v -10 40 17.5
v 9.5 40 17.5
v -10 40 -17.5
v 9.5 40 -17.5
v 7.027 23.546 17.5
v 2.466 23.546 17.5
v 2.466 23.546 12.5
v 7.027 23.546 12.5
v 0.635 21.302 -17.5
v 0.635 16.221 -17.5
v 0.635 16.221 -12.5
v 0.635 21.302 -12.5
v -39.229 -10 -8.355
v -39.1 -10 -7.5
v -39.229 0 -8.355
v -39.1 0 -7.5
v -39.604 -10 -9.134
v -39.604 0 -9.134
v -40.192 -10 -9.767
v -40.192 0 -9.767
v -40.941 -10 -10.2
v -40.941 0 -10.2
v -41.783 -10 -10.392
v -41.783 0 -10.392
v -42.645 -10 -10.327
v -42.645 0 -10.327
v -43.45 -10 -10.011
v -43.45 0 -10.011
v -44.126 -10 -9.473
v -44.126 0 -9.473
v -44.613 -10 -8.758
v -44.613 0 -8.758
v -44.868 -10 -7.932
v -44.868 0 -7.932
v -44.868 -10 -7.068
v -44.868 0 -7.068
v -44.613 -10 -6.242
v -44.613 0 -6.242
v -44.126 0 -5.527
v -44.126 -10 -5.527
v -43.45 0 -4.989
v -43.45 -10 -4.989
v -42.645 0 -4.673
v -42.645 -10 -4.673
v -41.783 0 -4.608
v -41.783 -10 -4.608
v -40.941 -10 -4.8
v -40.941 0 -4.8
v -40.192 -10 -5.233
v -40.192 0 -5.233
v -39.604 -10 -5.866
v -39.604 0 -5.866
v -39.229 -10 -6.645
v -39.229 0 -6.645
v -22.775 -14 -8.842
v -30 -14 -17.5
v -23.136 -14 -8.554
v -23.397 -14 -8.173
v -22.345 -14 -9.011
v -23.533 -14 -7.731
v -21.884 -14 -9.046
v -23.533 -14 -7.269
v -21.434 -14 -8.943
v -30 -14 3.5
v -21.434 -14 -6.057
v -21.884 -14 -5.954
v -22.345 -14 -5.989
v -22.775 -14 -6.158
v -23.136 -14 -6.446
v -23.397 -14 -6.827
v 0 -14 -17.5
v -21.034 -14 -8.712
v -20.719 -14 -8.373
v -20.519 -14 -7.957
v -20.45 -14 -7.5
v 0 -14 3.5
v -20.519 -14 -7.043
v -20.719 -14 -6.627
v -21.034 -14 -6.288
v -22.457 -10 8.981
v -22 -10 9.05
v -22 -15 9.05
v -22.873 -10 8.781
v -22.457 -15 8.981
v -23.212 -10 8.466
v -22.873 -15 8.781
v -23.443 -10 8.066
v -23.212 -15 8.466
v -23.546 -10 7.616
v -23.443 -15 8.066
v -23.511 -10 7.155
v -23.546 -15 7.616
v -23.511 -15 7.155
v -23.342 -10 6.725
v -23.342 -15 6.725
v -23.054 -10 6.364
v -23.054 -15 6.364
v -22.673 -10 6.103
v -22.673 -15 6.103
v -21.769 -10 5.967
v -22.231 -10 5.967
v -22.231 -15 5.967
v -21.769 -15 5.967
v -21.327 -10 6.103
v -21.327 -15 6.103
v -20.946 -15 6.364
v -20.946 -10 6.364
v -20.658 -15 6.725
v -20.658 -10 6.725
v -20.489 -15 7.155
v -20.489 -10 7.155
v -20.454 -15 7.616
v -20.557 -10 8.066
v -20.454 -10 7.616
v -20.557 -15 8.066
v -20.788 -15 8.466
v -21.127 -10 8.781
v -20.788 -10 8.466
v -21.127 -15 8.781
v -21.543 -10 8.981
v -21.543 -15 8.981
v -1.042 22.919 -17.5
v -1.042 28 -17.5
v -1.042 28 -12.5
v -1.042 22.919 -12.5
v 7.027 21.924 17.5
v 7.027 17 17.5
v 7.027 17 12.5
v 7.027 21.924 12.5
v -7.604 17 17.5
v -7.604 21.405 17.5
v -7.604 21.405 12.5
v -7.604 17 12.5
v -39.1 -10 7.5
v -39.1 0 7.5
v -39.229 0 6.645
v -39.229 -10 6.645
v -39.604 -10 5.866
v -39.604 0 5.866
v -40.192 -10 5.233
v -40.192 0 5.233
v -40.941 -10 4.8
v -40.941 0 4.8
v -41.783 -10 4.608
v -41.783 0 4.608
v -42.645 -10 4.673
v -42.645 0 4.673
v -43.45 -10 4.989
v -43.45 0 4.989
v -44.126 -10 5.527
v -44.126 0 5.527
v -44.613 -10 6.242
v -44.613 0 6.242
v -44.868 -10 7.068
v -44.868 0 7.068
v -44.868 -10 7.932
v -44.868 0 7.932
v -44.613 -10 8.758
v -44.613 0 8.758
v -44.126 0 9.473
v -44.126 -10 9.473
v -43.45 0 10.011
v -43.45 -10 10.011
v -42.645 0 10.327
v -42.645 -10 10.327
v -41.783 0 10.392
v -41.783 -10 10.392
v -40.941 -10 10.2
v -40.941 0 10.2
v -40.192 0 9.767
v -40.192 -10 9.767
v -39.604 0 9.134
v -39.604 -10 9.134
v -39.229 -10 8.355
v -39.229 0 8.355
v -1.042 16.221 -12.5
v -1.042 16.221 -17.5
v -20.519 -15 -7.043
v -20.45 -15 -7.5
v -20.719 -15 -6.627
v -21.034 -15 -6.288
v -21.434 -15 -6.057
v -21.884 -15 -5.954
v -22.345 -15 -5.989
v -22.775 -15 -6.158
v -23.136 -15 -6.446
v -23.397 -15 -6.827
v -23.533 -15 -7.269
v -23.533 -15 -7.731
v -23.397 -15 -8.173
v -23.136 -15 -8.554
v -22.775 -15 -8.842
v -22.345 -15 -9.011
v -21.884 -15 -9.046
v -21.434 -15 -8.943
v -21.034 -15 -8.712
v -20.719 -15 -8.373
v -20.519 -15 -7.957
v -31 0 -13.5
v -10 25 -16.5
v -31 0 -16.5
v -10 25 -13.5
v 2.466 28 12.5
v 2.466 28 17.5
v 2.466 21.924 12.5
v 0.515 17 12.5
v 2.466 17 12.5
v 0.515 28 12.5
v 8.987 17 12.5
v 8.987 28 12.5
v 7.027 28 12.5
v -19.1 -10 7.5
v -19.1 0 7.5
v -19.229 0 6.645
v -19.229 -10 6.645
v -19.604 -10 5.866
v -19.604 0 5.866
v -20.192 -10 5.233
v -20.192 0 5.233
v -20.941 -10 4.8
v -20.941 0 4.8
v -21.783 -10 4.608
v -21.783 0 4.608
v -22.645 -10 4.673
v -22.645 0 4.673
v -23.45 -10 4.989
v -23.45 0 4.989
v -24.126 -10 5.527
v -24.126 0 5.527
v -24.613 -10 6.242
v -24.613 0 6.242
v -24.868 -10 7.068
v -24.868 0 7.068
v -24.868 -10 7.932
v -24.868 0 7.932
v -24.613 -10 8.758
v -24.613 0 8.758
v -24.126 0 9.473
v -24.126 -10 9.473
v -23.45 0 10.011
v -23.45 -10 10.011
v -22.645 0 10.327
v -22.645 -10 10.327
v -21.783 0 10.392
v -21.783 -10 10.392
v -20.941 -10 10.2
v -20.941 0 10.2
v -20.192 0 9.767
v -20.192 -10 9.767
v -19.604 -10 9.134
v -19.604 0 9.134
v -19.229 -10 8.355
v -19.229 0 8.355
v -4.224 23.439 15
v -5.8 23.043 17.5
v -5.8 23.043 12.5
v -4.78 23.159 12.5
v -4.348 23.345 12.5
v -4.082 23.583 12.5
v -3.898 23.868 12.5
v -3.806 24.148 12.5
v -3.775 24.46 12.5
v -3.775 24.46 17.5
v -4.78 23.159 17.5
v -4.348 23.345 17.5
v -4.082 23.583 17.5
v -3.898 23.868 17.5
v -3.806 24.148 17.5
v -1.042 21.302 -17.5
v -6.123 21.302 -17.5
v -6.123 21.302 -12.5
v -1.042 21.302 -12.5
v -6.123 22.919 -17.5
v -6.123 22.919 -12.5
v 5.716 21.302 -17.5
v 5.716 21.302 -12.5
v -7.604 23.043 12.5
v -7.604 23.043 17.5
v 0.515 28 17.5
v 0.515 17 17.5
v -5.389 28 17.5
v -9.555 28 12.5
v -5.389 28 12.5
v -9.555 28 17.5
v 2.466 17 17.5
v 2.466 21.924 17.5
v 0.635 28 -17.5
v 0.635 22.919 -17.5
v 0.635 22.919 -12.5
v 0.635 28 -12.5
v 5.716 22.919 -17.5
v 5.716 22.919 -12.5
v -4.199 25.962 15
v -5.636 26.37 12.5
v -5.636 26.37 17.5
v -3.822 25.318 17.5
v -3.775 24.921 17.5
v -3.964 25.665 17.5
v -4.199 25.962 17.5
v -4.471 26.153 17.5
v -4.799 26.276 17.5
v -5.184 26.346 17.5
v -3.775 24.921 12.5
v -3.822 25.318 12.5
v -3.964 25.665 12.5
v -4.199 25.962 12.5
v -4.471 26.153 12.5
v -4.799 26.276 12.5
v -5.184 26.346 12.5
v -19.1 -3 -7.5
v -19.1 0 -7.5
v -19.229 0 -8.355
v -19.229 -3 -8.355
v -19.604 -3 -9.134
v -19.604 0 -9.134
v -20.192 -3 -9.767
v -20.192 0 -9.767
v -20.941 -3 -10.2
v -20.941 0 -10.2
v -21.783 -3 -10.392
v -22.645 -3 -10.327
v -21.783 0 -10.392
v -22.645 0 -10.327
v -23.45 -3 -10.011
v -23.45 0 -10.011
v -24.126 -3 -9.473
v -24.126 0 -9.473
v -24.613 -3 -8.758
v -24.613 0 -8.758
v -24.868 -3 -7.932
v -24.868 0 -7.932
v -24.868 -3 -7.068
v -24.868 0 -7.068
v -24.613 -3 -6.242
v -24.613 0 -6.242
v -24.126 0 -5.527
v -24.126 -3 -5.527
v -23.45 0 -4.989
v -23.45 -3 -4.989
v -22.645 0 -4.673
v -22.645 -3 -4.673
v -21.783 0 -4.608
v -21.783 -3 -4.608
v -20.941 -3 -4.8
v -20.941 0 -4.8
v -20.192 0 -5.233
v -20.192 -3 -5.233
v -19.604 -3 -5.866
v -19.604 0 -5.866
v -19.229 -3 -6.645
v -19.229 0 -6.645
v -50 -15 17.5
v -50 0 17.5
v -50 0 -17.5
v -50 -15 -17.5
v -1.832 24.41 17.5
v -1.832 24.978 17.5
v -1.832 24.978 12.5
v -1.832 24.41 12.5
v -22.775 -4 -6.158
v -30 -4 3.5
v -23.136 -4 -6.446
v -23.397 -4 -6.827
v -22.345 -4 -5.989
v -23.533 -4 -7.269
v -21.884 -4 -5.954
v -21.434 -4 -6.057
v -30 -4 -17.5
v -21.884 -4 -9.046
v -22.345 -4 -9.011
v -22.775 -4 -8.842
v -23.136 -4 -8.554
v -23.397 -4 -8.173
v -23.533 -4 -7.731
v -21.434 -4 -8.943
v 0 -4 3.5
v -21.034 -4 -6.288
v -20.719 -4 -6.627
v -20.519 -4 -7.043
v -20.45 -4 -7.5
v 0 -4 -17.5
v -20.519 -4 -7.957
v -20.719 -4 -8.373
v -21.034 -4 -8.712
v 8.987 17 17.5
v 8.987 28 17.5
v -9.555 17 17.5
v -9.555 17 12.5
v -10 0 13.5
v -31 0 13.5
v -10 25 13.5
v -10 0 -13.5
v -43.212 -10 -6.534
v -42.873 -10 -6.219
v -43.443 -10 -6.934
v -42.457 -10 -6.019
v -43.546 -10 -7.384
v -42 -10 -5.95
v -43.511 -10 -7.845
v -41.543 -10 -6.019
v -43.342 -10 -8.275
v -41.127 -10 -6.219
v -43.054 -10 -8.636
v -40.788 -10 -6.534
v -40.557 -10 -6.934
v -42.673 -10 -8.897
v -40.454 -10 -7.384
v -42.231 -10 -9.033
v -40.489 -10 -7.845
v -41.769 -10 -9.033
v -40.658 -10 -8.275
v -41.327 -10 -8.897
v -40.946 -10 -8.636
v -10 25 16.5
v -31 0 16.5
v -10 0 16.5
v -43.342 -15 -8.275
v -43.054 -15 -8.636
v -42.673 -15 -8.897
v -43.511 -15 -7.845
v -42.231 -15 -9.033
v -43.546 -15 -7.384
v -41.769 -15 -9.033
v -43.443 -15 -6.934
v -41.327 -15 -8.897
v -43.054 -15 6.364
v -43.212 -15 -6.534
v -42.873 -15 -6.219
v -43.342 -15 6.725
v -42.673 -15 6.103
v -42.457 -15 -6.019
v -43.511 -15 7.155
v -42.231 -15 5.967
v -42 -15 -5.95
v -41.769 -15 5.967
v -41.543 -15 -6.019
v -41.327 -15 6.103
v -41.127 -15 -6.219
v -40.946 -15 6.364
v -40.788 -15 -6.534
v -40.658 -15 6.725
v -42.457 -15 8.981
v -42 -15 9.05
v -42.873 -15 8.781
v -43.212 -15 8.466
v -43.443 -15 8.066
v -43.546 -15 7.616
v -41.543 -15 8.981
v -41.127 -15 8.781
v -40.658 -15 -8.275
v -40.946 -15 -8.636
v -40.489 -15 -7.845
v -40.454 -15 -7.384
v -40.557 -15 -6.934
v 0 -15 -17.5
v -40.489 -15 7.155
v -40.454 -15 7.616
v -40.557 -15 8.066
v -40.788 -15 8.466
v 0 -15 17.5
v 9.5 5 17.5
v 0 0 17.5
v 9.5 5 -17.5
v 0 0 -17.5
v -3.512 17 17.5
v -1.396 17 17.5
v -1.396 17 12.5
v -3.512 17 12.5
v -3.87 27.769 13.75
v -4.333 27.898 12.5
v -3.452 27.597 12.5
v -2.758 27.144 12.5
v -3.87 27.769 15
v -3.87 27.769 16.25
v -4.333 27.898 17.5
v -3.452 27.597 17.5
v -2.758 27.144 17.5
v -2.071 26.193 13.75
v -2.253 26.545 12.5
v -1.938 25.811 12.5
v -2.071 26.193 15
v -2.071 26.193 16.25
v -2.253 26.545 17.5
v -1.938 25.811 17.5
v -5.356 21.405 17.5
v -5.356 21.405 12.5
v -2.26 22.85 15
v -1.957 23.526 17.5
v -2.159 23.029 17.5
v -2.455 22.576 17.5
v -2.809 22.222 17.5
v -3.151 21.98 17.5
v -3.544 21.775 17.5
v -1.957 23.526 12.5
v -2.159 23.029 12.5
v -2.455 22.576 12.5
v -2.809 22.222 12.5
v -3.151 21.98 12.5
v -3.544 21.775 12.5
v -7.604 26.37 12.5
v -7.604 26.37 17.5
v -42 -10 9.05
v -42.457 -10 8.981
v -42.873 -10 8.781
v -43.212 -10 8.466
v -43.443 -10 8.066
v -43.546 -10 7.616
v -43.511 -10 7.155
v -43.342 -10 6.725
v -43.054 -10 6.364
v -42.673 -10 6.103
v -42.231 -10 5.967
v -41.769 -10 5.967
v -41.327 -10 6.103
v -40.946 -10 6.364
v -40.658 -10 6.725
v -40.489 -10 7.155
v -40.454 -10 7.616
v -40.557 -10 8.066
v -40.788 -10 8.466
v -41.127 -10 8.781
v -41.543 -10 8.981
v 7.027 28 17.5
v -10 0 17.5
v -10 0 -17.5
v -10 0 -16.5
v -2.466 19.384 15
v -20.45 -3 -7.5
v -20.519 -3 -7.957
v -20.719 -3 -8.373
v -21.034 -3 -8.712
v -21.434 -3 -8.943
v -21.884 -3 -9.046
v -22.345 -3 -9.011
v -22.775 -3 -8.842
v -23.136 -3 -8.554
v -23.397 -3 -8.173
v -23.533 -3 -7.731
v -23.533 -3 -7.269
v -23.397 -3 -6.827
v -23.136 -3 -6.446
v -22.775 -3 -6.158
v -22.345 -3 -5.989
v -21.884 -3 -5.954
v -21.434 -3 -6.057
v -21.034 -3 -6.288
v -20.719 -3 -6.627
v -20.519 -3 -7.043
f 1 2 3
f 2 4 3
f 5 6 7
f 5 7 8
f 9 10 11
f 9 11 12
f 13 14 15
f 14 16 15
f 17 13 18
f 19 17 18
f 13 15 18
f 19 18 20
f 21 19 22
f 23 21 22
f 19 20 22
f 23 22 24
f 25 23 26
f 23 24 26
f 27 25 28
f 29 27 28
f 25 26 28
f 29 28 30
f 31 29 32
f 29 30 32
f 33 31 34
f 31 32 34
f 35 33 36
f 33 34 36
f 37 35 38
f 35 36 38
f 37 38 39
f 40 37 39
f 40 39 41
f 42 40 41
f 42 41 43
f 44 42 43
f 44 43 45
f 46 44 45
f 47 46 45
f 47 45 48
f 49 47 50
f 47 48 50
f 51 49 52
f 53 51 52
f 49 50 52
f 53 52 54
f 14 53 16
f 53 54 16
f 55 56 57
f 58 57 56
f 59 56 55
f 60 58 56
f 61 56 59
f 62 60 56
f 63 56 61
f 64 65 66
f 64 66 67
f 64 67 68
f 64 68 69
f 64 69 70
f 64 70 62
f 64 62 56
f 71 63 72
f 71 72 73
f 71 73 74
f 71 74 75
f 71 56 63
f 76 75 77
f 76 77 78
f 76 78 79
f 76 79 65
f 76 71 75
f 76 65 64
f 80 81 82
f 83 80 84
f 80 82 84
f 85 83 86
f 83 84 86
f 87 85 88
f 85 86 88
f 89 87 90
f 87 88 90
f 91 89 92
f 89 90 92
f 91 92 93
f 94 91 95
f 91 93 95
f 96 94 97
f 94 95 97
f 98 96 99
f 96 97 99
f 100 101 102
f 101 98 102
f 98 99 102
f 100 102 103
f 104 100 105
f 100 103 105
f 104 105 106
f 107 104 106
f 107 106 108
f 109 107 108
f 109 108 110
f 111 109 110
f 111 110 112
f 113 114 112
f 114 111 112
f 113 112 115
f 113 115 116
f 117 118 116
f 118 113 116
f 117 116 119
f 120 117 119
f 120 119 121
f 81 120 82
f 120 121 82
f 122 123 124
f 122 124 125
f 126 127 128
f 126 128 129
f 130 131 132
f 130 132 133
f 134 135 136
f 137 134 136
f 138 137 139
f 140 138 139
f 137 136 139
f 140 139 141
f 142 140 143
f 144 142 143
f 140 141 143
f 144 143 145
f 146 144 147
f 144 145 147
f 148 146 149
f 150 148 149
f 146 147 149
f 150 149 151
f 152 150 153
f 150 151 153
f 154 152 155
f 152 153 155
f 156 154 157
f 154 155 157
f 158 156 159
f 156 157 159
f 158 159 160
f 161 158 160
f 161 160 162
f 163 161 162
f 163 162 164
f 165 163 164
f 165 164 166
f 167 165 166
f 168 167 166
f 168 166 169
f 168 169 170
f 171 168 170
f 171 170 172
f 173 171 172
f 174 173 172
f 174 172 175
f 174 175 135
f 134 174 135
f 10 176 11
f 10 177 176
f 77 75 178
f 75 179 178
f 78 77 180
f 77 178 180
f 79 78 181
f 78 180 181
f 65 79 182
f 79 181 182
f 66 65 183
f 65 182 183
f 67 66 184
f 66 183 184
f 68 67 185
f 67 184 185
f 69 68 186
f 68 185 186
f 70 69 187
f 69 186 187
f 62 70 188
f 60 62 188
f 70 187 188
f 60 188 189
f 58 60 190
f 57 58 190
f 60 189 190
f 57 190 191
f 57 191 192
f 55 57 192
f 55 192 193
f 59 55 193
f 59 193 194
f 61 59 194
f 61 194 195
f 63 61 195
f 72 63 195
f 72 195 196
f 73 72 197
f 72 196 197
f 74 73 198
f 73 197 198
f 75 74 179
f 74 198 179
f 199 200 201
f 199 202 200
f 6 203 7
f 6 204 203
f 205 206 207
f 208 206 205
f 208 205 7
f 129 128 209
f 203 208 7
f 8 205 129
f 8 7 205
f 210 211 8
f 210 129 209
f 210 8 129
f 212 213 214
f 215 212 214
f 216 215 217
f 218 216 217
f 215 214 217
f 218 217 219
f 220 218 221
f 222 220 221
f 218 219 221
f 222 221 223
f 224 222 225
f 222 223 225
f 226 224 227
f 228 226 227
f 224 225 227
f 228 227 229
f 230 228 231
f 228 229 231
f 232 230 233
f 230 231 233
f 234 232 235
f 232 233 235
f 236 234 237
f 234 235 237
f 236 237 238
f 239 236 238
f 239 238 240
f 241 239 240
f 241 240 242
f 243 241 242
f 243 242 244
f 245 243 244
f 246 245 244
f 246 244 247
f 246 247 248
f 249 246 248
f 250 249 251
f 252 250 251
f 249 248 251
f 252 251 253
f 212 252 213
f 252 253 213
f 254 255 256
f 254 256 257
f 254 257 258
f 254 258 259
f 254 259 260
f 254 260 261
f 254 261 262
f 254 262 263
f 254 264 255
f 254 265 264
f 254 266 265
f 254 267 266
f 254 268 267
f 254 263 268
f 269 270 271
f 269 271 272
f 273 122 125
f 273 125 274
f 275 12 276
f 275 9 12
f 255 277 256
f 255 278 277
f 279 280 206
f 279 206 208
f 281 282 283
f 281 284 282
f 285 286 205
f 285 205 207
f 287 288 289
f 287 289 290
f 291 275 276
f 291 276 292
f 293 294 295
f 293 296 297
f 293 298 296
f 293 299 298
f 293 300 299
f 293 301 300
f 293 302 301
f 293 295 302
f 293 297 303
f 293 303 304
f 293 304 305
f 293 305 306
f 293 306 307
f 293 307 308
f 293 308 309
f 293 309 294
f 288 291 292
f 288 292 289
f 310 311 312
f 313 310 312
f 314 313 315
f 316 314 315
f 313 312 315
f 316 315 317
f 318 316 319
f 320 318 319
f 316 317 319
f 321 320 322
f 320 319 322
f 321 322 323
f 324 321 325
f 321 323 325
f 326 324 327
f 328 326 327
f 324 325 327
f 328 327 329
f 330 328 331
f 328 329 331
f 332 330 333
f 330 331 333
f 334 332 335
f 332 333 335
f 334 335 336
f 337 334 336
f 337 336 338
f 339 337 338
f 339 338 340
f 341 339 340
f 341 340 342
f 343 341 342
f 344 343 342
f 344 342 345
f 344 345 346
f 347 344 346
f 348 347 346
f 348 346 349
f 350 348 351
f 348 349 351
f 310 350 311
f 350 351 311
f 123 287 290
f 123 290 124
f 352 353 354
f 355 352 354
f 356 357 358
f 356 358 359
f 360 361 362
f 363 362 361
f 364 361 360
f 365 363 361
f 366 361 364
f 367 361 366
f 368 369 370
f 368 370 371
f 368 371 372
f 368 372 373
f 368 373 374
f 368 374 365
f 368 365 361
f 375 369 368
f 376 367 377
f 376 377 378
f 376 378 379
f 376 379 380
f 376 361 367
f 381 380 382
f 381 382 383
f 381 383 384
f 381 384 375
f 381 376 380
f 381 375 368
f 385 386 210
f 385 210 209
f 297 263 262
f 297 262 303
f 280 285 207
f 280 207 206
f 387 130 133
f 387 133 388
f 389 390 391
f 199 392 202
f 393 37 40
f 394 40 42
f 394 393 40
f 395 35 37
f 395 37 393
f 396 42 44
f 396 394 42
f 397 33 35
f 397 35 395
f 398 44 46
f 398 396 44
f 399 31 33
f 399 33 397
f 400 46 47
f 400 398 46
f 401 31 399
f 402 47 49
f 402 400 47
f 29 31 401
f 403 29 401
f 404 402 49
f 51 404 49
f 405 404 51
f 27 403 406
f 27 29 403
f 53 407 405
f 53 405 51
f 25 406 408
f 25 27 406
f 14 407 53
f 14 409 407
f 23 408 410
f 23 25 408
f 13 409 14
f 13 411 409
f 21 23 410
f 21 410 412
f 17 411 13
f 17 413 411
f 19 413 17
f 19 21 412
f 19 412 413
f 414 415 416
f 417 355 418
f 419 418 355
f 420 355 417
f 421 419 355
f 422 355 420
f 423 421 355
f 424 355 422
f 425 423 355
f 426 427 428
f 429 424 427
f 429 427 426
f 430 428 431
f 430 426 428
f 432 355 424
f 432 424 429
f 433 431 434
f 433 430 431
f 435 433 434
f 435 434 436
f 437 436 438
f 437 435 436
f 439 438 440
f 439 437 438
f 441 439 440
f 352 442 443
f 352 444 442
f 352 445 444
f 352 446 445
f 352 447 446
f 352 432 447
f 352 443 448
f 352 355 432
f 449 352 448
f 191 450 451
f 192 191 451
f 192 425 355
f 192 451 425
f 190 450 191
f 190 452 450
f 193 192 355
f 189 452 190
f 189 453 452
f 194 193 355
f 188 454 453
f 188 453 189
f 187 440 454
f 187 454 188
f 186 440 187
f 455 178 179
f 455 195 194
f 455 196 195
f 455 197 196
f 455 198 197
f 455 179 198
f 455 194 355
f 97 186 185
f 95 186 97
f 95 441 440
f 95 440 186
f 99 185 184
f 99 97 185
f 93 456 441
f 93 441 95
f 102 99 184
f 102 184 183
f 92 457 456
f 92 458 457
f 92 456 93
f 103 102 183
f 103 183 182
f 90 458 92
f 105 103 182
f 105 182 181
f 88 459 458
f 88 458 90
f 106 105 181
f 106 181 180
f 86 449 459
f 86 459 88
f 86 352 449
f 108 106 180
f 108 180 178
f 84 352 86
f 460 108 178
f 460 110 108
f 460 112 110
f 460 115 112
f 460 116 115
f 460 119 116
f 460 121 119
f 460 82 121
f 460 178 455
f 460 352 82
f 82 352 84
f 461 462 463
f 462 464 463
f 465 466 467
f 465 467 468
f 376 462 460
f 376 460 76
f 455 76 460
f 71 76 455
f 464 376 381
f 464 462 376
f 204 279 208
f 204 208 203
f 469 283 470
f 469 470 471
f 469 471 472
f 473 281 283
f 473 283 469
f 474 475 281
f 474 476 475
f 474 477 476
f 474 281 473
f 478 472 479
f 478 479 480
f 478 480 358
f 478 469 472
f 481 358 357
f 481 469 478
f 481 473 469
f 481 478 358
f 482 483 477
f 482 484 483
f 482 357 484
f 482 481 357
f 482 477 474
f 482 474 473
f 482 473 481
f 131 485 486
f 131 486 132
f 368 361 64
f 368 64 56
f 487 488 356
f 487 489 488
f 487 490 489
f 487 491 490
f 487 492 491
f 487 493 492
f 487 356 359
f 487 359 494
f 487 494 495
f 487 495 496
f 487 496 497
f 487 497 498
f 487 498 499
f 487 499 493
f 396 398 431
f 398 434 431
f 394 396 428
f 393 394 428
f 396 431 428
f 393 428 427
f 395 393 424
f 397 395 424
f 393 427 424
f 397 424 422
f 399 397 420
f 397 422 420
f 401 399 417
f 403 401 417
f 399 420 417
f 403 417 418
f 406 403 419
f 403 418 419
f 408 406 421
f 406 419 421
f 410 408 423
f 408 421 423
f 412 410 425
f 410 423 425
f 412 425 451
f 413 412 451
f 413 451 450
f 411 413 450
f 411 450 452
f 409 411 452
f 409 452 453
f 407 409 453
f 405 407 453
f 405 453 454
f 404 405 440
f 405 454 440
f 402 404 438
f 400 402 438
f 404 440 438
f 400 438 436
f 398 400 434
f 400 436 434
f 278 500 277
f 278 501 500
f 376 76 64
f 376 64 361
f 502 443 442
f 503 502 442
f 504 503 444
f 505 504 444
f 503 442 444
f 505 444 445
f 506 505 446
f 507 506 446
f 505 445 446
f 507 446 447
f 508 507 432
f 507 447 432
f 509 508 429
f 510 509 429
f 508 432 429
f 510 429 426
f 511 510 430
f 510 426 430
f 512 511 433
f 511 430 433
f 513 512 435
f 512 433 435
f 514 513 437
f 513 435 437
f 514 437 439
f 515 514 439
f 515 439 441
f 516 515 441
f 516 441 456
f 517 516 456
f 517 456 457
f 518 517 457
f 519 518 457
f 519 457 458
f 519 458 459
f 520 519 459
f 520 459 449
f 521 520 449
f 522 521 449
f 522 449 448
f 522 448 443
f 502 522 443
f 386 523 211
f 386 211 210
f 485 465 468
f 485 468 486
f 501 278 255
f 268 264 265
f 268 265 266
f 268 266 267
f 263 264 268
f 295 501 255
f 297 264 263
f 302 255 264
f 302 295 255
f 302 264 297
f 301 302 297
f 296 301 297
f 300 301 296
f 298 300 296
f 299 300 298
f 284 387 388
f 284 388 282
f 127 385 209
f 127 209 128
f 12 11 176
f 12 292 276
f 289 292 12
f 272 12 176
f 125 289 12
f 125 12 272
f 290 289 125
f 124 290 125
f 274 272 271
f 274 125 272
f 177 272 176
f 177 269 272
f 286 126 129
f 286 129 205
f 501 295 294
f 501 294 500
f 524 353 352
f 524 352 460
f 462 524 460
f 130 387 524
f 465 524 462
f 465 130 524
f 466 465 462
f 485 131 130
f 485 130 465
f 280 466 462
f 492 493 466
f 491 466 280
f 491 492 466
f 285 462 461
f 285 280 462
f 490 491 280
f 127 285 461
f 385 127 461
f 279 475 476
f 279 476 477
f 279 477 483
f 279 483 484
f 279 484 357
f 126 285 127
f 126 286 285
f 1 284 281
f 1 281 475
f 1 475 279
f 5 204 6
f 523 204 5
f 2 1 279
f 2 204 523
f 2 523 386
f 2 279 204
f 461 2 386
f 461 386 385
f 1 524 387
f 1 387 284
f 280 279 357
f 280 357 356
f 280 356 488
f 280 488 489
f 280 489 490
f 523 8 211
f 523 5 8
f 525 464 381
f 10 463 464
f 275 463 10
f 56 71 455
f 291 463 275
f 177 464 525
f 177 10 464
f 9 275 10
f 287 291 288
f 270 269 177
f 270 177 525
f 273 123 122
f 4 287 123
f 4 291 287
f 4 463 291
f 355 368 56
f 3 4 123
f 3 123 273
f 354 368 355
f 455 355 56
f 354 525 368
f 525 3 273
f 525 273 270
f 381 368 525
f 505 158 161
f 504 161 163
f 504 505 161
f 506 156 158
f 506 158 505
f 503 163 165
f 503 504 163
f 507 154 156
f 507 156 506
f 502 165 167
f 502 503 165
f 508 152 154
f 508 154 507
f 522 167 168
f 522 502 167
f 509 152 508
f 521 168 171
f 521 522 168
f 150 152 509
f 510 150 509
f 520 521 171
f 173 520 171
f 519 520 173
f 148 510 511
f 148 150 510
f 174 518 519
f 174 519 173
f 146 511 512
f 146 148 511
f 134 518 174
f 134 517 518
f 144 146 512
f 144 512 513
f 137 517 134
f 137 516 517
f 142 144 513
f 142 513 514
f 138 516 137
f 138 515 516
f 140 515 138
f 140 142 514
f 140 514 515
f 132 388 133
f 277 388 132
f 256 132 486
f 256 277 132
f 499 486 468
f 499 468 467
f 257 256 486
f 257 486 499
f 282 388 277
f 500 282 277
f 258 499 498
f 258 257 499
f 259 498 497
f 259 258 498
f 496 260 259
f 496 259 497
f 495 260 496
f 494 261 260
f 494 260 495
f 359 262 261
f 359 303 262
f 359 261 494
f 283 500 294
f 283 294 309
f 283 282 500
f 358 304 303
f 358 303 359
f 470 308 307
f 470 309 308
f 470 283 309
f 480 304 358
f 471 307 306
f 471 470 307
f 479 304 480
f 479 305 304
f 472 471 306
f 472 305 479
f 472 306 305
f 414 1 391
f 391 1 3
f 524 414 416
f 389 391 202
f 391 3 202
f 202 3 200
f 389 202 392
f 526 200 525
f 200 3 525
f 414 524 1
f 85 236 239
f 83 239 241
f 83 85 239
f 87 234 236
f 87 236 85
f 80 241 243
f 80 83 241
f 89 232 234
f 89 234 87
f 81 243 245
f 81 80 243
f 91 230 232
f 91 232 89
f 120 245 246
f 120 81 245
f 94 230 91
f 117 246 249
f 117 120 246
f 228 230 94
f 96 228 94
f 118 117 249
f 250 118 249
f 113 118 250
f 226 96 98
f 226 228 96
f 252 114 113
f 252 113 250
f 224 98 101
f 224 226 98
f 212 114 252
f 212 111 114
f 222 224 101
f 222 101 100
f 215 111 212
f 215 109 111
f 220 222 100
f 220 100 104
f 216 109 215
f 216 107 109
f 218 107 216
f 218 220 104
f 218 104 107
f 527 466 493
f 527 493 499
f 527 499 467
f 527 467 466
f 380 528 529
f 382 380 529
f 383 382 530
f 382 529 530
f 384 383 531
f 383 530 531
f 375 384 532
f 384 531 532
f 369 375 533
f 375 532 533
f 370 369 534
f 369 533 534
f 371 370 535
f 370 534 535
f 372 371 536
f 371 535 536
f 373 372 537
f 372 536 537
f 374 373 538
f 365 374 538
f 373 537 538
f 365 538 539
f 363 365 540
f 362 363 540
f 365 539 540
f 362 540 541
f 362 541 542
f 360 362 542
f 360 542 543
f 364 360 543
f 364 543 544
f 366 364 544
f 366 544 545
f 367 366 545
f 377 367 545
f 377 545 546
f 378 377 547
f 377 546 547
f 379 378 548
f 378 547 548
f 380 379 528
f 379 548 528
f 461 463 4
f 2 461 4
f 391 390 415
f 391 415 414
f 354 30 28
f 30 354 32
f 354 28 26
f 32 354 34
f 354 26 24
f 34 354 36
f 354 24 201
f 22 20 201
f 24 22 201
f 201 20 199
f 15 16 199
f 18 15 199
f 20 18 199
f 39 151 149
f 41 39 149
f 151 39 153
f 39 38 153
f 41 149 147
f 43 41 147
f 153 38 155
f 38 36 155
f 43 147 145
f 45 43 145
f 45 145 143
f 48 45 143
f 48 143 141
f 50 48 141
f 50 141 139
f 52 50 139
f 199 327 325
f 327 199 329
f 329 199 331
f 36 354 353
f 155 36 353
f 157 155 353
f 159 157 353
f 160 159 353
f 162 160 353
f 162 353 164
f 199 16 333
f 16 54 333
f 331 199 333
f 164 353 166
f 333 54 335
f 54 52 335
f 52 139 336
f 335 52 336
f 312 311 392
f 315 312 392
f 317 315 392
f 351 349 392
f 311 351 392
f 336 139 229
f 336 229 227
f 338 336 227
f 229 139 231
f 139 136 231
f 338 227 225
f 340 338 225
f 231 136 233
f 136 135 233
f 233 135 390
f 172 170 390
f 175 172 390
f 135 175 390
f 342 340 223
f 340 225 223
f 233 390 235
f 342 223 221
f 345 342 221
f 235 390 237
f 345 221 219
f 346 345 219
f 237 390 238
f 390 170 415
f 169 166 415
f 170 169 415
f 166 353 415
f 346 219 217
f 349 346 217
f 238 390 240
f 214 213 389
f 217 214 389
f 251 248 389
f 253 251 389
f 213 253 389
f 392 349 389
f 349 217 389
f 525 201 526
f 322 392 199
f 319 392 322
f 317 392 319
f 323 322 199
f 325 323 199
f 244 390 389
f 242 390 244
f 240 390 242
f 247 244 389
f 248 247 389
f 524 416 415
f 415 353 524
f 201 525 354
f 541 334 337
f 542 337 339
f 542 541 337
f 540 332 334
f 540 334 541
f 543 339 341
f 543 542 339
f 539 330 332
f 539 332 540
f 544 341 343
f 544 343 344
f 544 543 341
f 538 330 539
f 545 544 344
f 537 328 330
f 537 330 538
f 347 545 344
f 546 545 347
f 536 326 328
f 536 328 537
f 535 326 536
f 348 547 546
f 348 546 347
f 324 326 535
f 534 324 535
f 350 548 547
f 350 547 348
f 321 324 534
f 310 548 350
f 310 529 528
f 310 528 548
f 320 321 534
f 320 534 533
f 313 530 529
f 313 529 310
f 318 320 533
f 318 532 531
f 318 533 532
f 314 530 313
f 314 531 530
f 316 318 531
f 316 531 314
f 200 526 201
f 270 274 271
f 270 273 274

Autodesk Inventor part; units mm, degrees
ref_plane "YZ Plane" through (0, 0, 0) normal (1, 0, 0) x (0, 1, 0)
ref_plane "XZ Plane" through (0, 0, 0) normal (0, 1, 0) x (-1, 0, 0)
sketch "Sketch1" plane through (0, 0, 0) normal (0, 0, 1) x (1, 0, 0)
  line L0 (-10, 40) -> (-10, 0)
  line L1 (-10, 0) -> (0, 0)
  line L2 (0, 0) -> (9.5, 5)
  line L3 (9.5, 5) -> (9.5, 40)
  line L4 (9.5, 40) -> (-10, 40)
  dimension "d0" = 40
  dimension "d2" = 10
  dimension "d55" = 9.5
  dimension "d57" = 35
extrude "Extrusion1" add sketch "Sketch1" along normal mid plane 35
ref_plane "Work Plane1" through (0, 0, 15) normal (0, 0, 1) x (1, 0, 0)
sketch "Sketch2" plane through (0, 0, 15) normal (0, 0, 1) x (1, 0, 0)
  line L0 (-10, 40) -> (-10, 0) projected
  line L1 (-10, 0) -> (0, 0) projected
  line L2 (-10, 0) -> (-31, 0)
  line L3 (-10, 0) -> (11, 0) construction
  line L4 (0, 0) -> (9.5, 5) projected
  line L5 (9.5, 5) -> (9.5, 40) projected
  line L6 (9.5, 40) -> (-10, 40) projected
  line L7 (-31, 0) -> (-10, 25)
  line L8 (-10, 0) -> (-10, 25)
  dimension "d9" = 21
  dimension "d10" = 180
  dimension "d88" = 25
extrude "Extrusion2" add sketch "Sketch2" along normal mid plane 3 contours L0 L2 L7
mirror "Mirror1" about plane through (0, 0, 0) normal (0, 0, 1) of "Extrusion2"
sketch "Sketch3" plane through (-10, 0, 17.5) normal (0, -1, 0) x (1, 0, 0)
  line L0 (-40, 2) -> (-15.2727, 11)
  line L1 (-15.2727, 11) -> (10, 11)
  line L2 (10, 11) -> (10, -46)
  line L3 (-40, 2) -> (-40, -37)
  line L4 (-40, -37) -> (-15.2727, -46)
  line L5 (-15.2727, -46) -> (10, -46)
  line L6 (10, -35) -> (10, 0) projected
  line L7 (10, -35) -> (10, 0) projected
  line L8 (0, 0) -> (0, -1) projected
  line L9 (10, -35) -> (0, -35) projected
  line L10 (0, 0) -> (10, 0) projected
  line L11 (-21, -1) -> (0, -1) projected
  line L12 (-21, -4) -> (-21, -1) projected
  line L13 (0, -4) -> (-21, -4) projected
  line L14 (0, -4) -> (0, -31) projected
  line L15 (0, -31) -> (-21, -31) projected
  line L16 (-21, -31) -> (-21, -34) projected
  line L17 (-21, -34) -> (0, -34) projected
  line L18 (0, -34) -> (0, -35) projected
  point P0 (10, -17.5)
  point P1 (-2.6364, 11)
  point P2 (10, -17.5)
  point P3 (10, -17.5)
  point P4 (10, -17.5)
  point P5 (-2.6364, -46)
  point P6 (-40, -17.5)
  point P7 (10, -17.5)
  point P8 (10, -35)
  point P9 (10, 0)
  dimension "d17" = 57
  dimension "d18" = 39
  dimension "d19" = 9
  dimension "d20" = 9
  dimension "d21" = 50
  dimension "d76" = 110
extrude "Extrusion3" add sketch "Sketch3" along normal blind 15
sketch "Sketch4" plane through (-10, 0, 17.5) normal (0, 1, 0) x (1, 0, 0)
  line L0 (10, 17.5) -> (-48, 17.5) construction
  line L1 (-32, 10) -> (-12, 10) construction
  line L2 (-32, 25) -> (-32, 10) construction
  line L3 (10, 35) -> (0, 35) projected
  line L4 (10, 46) -> (10, 35) projected
  line L5 (-15.2727, 46) -> (10, 46) projected
  line L6 (-40, 37) -> (-15.2727, 46) projected
  line L7 (-40, -2) -> (-40, 37) projected
  line L8 (-15.2727, -11) -> (-40, -2) projected
  line L9 (10, -11) -> (-15.2727, -11) projected
  line L10 (10, 0) -> (10, -11) projected
  line L11 (0, 0) -> (10, 0) projected
  line L12 (0, 0) -> (0, 1) projected
  line L13 (-21, 1) -> (0, 1) projected
  line L14 (-21, 4) -> (-21, 1) projected
  line L15 (0, 4) -> (-21, 4) projected
  line L16 (0, 4) -> (0, 31) projected
  line L17 (0, 31) -> (-21, 31) projected
  line L18 (-21, 31) -> (-21, 34) projected
  line L19 (-21, 34) -> (0, 34) projected
  line L20 (0, 34) -> (0, 35) projected
  point P0 (-32, 17.5)
  point P1 (-19, 17.5)
  dimension "d26" = 20
  dimension "d27" = 15
  dimension "d58" = 13
  dimension "d59" = 8
hole "Hole1" at (-42, 0, 7.5) at (-22, 0, 7.5) at (-42, 0, -7.5) direction (0, -1, 0) diameter 3.1 end through all
sketch "Sketch5" plane through (0, 0, -17.5) normal (1, 0, 0) x (0, 0, -1)
  line L0 (11, 0) -> (0, 0) projected
  line L1 (-35, 0) -> (-46, 0) projected
  line L2 (-46, 0) -> (-46, -15) projected
  line L3 (11, -15) -> (-46, -15) projected
  line L4 (11, 0) -> (11, -15) projected
  line L5 (-46, 0) -> (-46, -15) projected
  line L6 (-21, -4) -> (9, -4)
  line L7 (9, -4) -> (9, -14)
  line L8 (9, -14) -> (-21, -14)
  line L9 (-21, -14) -> (-21, -4)
  line L10 (0, 0) -> (-35, 0) projected
  point P0 (-17.5, 0)
  point P1 (-17.5, 0)
  point P2 (-46, -7.5)
  point P3 (-46, -7.5)
  point P4 (11, -12.5)
  point P5 (11, -2.5)
  dimension "d46" = 30
  dimension "d47" = 10
  dimension "d48" = 2
  dimension "d49" = 4
extrude "Extrusion4" cut sketch "Sketch5" against normal blind 30 contours L6 L7 L8 L9
sketch "Sketch6" plane through (-10, 0, 17.5) normal (0, 1, 0) x (1, 0, 0)
  circle A0 centre (-32, 25) radius 1.55 projected
  circle A1 centre (-12, 10) radius 1.55 projected
  circle A2 centre (-32, 10) radius 1.55 projected
  line L0 (10, 35) -> (0, 35) projected
  line L1 (10, 46) -> (10, 35) projected
  line L2 (-15.2727, 46) -> (10, 46) projected
  line L3 (-40, 37) -> (-15.2727, 46) projected
  line L4 (-40, -2) -> (-40, 37) projected
  line L5 (-15.2727, -11) -> (-40, -2) projected
  line L6 (10, -11) -> (-15.2727, -11) projected
  line L7 (10, 0) -> (10, -11) projected
  line L8 (0, 0) -> (10, 0) projected
  line L9 (0, 0) -> (0, 1) projected
  circle A3 centre (-12, 25) radius 2.9
  line L10 (-21, 1) -> (0, 1) projected
  line L11 (-21, 4) -> (-21, 1) projected
  line L12 (0, 4) -> (-21, 4) projected
  line L13 (0, 4) -> (0, 31) projected
  line L14 (0, 31) -> (-21, 31) projected
  line L15 (-21, 31) -> (-21, 34) projected
  line L16 (-21, 34) -> (0, 34) projected
  line L17 (0, 34) -> (0, 35) projected
  point P0 (10, 17.5)
  dimension "d41" = 5.8
  dimension "d42" = 20
  dimension "d43" = 15
extrude "Extrusion5" cut sketch "Sketch6" against normal blind 3 contours A3
sketch "Sketch7" plane through (-10, -15, 17.5) normal (0, -1, 0) x (1, 0, 0)
  circle A0 centre (-12, -25) radius 1.55
  circle A1 centre (-32, -25) radius 1.55 projected
  circle A2 centre (-12, -10) radius 1.55 projected
  circle A3 centre (-32, -10) radius 1.55 projected
  line L0 (10, -46) -> (10, 11) projected
  line L1 (10, 11) -> (-15.2727, 11) projected
  line L2 (-15.2727, 11) -> (-40, 2) projected
  line L3 (-40, 2) -> (-40, -37) projected
  line L4 (-40, -37) -> (-15.2727, -46) projected
  line L5 (-15.2727, -46) -> (10, -46) projected
  point P0 (10, -17.5)
  dimension "d50" = 15
  dimension "d51" = 20
  dimension "d52" = 3.1
extrude "Extrusion6" cut sketch "Sketch7" against normal up to surface (1 mm away) contours A0
sketch "Sketch8" plane through (0, 0, 17.5) normal (0, 0, 1) x (1, 0, 0)
  line L0 (-10, 0) -> (0, 0) projected
  line L1 (0, 0) -> (9.5, 5) projected
  line L2 (9.5, 5) -> (9.5, 40) projected
  line L3 (9.5, 40) -> (-10, 40) projected
  line L4 (-10, 40) -> (-10, 0) projected
  line L5 (-10.7901, 28) -> (5, 28) construction
  line L6 (5, 28) -> (5, 11.9362) construction
  line L7 (5, 11.9362) -> (-10.7901, 11.9362) construction
  line L8 (-10.7901, 11.9362) -> (-10.7901, 28) construction
  line L9 (-5.3559, 21.4049) -> (-7.6037, 21.4049)
  line L10 (-7.6037, 21.4049) -> (-7.6037, 17)
  line L11 (-7.6037, 17) -> (-9.555, 17)
  line L12 (-9.555, 17) -> (-9.555, 28)
  line L13 (-9.555, 28) -> (-5.3889, 28)
  spline S0 degree 2 poles (-5.3889, 28) (-4.5326, 28) (-3.207, 27.5389) (-2.3095, 26.7485) (-1.832, 25.637) (-1.832, 24.9783) knots 0 0 0 1 2 3 4 4 4
  line L14 (-1.832, 24.9783) -> (-1.832, 24.4102)
  spline S1 degree 2 poles (-1.832, 24.4102) (-1.832, 23.5457) (-2.6883, 22.1542) (-3.5445, 21.7754) knots 0 0 0 1 2 2 2
  spline S2 degree 2 poles (-3.5445, 21.7754) (-2.9929, 20.5651) (-1.939, 18.2021) (-1.3956, 17) knots 0 0 0 1 2 2 2
  line L15 (-1.3956, 17) -> (-3.5116, 17)
  line L16 (-3.5116, 17) -> (-5.3559, 21.4049)
  line L17 (-7.6037, 26.3698) -> (-7.6037, 23.0434)
  line L18 (-7.6037, 23.0434) -> (-5.8005, 23.0434)
  spline S3 degree 2 poles (-5.8005, 23.0434) (-4.6725, 23.0434) (-3.7751, 23.8338) (-3.7751, 24.4596) knots 0 0 0 1 2 2 2
  line L19 (-3.7751, 24.4596) -> (-3.7751, 24.9207)
  spline S4 degree 2 poles (-3.7751, 24.9207) (-3.7751, 25.5546) (-4.6231, 26.3698) (-5.6359, 26.3698) knots 0 0 0 1 2 2 2
  line L20 (-5.6359, 26.3698) -> (-7.6037, 26.3698)
  line L21 (7.0273, 21.9237) -> (2.4659, 21.9237)
  line L22 (2.4659, 21.9237) -> (2.4659, 17)
  line L23 (2.4659, 17) -> (0.5146, 17)
  line L24 (0.5146, 17) -> (0.5146, 28)
  line L25 (0.5146, 28) -> (2.4659, 28)
  line L26 (2.4659, 28) -> (2.4659, 23.5457)
  line L27 (2.4659, 23.5457) -> (7.0273, 23.5457)
  line L28 (7.0273, 23.5457) -> (7.0273, 28)
  line L29 (7.0273, 28) -> (8.9869, 28)
  line L30 (8.9869, 28) -> (8.9869, 17)
  line L31 (8.9869, 17) -> (7.0273, 17)
  line L32 (7.0273, 17) -> (7.0273, 21.9237)
  point P0 (-7, 15)
  dimension "d68" = 12
  dimension "d69" = 15
extrude "Extrusion7" cut sketch "Sketch8" against normal blind 5 contours L9 L10 L11 L12 L13 S0 L14 S1 S2 L15 L16 | L21 L22 L23 L24 L25 L26 L27 L28 L29 L30 L31 L32
sketch "Sketch9" plane through (0, 0, -17.5) normal (0, 0, -1) x (-1, 0, 0)
  line L0 (-0.5146, 17) -> (-0.5146, 28) projected
  line L1 (0, 0) -> (10, 0) projected
  line L2 (10, 0) -> (10, 40) projected
  line L3 (10, 40) -> (-9.5, 40) projected
  line L4 (-9.5, 40) -> (-9.5, 5) projected
  line L5 (-9.5, 5) -> (0, 0) projected
  line L6 (-7.3088, 28) -> (-3.8059, 28) construction
  line L7 (-3.8059, 28) -> (-3.8059, 25.5662) construction
  line L8 (-3.8059, 25.5662) -> (-7.3088, 25.5662) construction
  line L9 (-7.3088, 25.5662) -> (-7.3088, 28) construction
  line L10 (5.5, 50.4054) -> (5.5, 41.2692)
  line L11 (6.1232, 21.3023) -> (1.0421, 21.3023)
  line L12 (1.0421, 21.3023) -> (1.0421, 16.2212)
  line L13 (1.0421, 16.2212) -> (-0.6353, 16.2212)
  line L14 (-0.6353, 16.2212) -> (-0.6353, 21.3023)
  line L15 (-0.6353, 21.3023) -> (-5.7164, 21.3023)
  line L16 (-5.7164, 21.3023) -> (-5.7164, 22.919)
  line L17 (-5.7164, 22.919) -> (-0.6353, 22.919)
  line L18 (-0.6353, 22.919) -> (-0.6353, 28)
  line L19 (-0.6353, 28) -> (1.0421, 28)
  line L20 (1.0421, 28) -> (1.0421, 22.919)
  line L21 (1.0421, 22.919) -> (6.1232, 22.919)
  line L22 (6.1232, 22.919) -> (6.1232, 21.3023)
  dimension "d72" = 12
  dimension "d73" = 15
extrude "Extrusion8" cut sketch "Sketch9" against normal blind 5 contours L11 L12 L13 L14 L15 L16 L17 L18 L19 L20 L21 L22
sketch "Sketch10" plane through (-10, 0, 17.5) normal (0, 1, 0) x (1, 0, 0)
  line L0 (-39.35, 19.5) -> (-4.65, 19.5) projected
  circle A0 centre (-32, 25) radius 1.55 projected
  circle A1 centre (-32, 10) radius 1.55 projected
  circle A2 centre (-12, 10) radius 1.55 projected
  circle A3 centre (-32, 25) radius 2.9
  circle A4 centre (-32, 10) radius 2.9
  circle A5 centre (-12, 10) radius 2.9
  point P0 (10, 17.5)
  dimension "d77" = 5.8
  dimension "d78" = 5.8
  dimension "d79" = 5.8
extrude "Extrusion9" cut sketch "Sketch10" against normal blind 10 contours A0 | A1 | A3 | A4 | A5
sketch "Sketch12" plane through (-10, 0, 17.5) normal (0, 1, 0) x (1, 0, 0)
  circle A0 centre (-12, 25) radius 2.9 projected
  circle A1 centre (-12, 25) radius 1.55
  point P0 (10, 17.5)
  dimension "d85" = 3.1
extrude "Extrusion11" cut sketch "Sketch12" against normal blind 4 contours A1
sketch "Sketch13" plane through (-10, 0, 17.5) normal (0, 1, 0) x (1, 0, 0)
  circle A0 centre (-12, 10) radius 2.9 projected
  circle A1 centre (-32, 25) radius 2.9 projected
  circle A2 centre (-32, 10) radius 2.9 projected
  circle A3 centre (-12, 25) radius 2.9 projected
  line L0 (10, 35) -> (0, 35) projected
  line L1 (10, 46) -> (10, 35) projected
  line L2 (-15.2727, 46) -> (10, 46) projected
  line L3 (-40, 37) -> (-15.2727, 46) projected
  line L4 (-40, -2) -> (-40, 37) projected
  line L5 (-15.2727, -11) -> (-40, -2) projected
  line L6 (10, -11) -> (-15.2727, -11) projected
  line L7 (10, 0) -> (10, -11) projected
  line L8 (0, 0) -> (10, 0) projected
  line L9 (0, 0) -> (0, 1) projected
  line L10 (-21, 1) -> (0, 1) projected
  line L11 (-21, 4) -> (-21, 1) projected
  line L12 (0, 4) -> (-21, 4) projected
  line L13 (0, 4) -> (0, 31) projected
  line L14 (0, 31) -> (-21, 31) projected
  line L15 (-21, 31) -> (-21, 34) projected
  line L16 (-21, 34) -> (0, 34) projected
  line L17 (0, 34) -> (0, 35) projected
  line L18 (10, -11) -> (-40, -11)
  line L19 (-40, -11) -> (-40, 0)
  line L20 (-40, 0) -> (10, 0)
  line L21 (10, 0) -> (10, -11)
  line L22 (10, 46) -> (-40, 46)
  line L23 (-40, 46) -> (-40, 35)
  line L24 (-40, 35) -> (10, 35)
  line L25 (10, 35) -> (10, 46)
  point P0 (10, 17.5)
  point P1 (10, 40.5)
  point P2 (-40, 35)
  dimension "d89" = 11
  dimension "d92" = 11
  dimension "d93" = 50
extrude "Extrusion12" cut sketch "Sketch13" against normal blind 30 contours L0 L24 L4 L3 L2 L1 | L20 L8 L7 L6 L5 L4
properties part number "gripper"
